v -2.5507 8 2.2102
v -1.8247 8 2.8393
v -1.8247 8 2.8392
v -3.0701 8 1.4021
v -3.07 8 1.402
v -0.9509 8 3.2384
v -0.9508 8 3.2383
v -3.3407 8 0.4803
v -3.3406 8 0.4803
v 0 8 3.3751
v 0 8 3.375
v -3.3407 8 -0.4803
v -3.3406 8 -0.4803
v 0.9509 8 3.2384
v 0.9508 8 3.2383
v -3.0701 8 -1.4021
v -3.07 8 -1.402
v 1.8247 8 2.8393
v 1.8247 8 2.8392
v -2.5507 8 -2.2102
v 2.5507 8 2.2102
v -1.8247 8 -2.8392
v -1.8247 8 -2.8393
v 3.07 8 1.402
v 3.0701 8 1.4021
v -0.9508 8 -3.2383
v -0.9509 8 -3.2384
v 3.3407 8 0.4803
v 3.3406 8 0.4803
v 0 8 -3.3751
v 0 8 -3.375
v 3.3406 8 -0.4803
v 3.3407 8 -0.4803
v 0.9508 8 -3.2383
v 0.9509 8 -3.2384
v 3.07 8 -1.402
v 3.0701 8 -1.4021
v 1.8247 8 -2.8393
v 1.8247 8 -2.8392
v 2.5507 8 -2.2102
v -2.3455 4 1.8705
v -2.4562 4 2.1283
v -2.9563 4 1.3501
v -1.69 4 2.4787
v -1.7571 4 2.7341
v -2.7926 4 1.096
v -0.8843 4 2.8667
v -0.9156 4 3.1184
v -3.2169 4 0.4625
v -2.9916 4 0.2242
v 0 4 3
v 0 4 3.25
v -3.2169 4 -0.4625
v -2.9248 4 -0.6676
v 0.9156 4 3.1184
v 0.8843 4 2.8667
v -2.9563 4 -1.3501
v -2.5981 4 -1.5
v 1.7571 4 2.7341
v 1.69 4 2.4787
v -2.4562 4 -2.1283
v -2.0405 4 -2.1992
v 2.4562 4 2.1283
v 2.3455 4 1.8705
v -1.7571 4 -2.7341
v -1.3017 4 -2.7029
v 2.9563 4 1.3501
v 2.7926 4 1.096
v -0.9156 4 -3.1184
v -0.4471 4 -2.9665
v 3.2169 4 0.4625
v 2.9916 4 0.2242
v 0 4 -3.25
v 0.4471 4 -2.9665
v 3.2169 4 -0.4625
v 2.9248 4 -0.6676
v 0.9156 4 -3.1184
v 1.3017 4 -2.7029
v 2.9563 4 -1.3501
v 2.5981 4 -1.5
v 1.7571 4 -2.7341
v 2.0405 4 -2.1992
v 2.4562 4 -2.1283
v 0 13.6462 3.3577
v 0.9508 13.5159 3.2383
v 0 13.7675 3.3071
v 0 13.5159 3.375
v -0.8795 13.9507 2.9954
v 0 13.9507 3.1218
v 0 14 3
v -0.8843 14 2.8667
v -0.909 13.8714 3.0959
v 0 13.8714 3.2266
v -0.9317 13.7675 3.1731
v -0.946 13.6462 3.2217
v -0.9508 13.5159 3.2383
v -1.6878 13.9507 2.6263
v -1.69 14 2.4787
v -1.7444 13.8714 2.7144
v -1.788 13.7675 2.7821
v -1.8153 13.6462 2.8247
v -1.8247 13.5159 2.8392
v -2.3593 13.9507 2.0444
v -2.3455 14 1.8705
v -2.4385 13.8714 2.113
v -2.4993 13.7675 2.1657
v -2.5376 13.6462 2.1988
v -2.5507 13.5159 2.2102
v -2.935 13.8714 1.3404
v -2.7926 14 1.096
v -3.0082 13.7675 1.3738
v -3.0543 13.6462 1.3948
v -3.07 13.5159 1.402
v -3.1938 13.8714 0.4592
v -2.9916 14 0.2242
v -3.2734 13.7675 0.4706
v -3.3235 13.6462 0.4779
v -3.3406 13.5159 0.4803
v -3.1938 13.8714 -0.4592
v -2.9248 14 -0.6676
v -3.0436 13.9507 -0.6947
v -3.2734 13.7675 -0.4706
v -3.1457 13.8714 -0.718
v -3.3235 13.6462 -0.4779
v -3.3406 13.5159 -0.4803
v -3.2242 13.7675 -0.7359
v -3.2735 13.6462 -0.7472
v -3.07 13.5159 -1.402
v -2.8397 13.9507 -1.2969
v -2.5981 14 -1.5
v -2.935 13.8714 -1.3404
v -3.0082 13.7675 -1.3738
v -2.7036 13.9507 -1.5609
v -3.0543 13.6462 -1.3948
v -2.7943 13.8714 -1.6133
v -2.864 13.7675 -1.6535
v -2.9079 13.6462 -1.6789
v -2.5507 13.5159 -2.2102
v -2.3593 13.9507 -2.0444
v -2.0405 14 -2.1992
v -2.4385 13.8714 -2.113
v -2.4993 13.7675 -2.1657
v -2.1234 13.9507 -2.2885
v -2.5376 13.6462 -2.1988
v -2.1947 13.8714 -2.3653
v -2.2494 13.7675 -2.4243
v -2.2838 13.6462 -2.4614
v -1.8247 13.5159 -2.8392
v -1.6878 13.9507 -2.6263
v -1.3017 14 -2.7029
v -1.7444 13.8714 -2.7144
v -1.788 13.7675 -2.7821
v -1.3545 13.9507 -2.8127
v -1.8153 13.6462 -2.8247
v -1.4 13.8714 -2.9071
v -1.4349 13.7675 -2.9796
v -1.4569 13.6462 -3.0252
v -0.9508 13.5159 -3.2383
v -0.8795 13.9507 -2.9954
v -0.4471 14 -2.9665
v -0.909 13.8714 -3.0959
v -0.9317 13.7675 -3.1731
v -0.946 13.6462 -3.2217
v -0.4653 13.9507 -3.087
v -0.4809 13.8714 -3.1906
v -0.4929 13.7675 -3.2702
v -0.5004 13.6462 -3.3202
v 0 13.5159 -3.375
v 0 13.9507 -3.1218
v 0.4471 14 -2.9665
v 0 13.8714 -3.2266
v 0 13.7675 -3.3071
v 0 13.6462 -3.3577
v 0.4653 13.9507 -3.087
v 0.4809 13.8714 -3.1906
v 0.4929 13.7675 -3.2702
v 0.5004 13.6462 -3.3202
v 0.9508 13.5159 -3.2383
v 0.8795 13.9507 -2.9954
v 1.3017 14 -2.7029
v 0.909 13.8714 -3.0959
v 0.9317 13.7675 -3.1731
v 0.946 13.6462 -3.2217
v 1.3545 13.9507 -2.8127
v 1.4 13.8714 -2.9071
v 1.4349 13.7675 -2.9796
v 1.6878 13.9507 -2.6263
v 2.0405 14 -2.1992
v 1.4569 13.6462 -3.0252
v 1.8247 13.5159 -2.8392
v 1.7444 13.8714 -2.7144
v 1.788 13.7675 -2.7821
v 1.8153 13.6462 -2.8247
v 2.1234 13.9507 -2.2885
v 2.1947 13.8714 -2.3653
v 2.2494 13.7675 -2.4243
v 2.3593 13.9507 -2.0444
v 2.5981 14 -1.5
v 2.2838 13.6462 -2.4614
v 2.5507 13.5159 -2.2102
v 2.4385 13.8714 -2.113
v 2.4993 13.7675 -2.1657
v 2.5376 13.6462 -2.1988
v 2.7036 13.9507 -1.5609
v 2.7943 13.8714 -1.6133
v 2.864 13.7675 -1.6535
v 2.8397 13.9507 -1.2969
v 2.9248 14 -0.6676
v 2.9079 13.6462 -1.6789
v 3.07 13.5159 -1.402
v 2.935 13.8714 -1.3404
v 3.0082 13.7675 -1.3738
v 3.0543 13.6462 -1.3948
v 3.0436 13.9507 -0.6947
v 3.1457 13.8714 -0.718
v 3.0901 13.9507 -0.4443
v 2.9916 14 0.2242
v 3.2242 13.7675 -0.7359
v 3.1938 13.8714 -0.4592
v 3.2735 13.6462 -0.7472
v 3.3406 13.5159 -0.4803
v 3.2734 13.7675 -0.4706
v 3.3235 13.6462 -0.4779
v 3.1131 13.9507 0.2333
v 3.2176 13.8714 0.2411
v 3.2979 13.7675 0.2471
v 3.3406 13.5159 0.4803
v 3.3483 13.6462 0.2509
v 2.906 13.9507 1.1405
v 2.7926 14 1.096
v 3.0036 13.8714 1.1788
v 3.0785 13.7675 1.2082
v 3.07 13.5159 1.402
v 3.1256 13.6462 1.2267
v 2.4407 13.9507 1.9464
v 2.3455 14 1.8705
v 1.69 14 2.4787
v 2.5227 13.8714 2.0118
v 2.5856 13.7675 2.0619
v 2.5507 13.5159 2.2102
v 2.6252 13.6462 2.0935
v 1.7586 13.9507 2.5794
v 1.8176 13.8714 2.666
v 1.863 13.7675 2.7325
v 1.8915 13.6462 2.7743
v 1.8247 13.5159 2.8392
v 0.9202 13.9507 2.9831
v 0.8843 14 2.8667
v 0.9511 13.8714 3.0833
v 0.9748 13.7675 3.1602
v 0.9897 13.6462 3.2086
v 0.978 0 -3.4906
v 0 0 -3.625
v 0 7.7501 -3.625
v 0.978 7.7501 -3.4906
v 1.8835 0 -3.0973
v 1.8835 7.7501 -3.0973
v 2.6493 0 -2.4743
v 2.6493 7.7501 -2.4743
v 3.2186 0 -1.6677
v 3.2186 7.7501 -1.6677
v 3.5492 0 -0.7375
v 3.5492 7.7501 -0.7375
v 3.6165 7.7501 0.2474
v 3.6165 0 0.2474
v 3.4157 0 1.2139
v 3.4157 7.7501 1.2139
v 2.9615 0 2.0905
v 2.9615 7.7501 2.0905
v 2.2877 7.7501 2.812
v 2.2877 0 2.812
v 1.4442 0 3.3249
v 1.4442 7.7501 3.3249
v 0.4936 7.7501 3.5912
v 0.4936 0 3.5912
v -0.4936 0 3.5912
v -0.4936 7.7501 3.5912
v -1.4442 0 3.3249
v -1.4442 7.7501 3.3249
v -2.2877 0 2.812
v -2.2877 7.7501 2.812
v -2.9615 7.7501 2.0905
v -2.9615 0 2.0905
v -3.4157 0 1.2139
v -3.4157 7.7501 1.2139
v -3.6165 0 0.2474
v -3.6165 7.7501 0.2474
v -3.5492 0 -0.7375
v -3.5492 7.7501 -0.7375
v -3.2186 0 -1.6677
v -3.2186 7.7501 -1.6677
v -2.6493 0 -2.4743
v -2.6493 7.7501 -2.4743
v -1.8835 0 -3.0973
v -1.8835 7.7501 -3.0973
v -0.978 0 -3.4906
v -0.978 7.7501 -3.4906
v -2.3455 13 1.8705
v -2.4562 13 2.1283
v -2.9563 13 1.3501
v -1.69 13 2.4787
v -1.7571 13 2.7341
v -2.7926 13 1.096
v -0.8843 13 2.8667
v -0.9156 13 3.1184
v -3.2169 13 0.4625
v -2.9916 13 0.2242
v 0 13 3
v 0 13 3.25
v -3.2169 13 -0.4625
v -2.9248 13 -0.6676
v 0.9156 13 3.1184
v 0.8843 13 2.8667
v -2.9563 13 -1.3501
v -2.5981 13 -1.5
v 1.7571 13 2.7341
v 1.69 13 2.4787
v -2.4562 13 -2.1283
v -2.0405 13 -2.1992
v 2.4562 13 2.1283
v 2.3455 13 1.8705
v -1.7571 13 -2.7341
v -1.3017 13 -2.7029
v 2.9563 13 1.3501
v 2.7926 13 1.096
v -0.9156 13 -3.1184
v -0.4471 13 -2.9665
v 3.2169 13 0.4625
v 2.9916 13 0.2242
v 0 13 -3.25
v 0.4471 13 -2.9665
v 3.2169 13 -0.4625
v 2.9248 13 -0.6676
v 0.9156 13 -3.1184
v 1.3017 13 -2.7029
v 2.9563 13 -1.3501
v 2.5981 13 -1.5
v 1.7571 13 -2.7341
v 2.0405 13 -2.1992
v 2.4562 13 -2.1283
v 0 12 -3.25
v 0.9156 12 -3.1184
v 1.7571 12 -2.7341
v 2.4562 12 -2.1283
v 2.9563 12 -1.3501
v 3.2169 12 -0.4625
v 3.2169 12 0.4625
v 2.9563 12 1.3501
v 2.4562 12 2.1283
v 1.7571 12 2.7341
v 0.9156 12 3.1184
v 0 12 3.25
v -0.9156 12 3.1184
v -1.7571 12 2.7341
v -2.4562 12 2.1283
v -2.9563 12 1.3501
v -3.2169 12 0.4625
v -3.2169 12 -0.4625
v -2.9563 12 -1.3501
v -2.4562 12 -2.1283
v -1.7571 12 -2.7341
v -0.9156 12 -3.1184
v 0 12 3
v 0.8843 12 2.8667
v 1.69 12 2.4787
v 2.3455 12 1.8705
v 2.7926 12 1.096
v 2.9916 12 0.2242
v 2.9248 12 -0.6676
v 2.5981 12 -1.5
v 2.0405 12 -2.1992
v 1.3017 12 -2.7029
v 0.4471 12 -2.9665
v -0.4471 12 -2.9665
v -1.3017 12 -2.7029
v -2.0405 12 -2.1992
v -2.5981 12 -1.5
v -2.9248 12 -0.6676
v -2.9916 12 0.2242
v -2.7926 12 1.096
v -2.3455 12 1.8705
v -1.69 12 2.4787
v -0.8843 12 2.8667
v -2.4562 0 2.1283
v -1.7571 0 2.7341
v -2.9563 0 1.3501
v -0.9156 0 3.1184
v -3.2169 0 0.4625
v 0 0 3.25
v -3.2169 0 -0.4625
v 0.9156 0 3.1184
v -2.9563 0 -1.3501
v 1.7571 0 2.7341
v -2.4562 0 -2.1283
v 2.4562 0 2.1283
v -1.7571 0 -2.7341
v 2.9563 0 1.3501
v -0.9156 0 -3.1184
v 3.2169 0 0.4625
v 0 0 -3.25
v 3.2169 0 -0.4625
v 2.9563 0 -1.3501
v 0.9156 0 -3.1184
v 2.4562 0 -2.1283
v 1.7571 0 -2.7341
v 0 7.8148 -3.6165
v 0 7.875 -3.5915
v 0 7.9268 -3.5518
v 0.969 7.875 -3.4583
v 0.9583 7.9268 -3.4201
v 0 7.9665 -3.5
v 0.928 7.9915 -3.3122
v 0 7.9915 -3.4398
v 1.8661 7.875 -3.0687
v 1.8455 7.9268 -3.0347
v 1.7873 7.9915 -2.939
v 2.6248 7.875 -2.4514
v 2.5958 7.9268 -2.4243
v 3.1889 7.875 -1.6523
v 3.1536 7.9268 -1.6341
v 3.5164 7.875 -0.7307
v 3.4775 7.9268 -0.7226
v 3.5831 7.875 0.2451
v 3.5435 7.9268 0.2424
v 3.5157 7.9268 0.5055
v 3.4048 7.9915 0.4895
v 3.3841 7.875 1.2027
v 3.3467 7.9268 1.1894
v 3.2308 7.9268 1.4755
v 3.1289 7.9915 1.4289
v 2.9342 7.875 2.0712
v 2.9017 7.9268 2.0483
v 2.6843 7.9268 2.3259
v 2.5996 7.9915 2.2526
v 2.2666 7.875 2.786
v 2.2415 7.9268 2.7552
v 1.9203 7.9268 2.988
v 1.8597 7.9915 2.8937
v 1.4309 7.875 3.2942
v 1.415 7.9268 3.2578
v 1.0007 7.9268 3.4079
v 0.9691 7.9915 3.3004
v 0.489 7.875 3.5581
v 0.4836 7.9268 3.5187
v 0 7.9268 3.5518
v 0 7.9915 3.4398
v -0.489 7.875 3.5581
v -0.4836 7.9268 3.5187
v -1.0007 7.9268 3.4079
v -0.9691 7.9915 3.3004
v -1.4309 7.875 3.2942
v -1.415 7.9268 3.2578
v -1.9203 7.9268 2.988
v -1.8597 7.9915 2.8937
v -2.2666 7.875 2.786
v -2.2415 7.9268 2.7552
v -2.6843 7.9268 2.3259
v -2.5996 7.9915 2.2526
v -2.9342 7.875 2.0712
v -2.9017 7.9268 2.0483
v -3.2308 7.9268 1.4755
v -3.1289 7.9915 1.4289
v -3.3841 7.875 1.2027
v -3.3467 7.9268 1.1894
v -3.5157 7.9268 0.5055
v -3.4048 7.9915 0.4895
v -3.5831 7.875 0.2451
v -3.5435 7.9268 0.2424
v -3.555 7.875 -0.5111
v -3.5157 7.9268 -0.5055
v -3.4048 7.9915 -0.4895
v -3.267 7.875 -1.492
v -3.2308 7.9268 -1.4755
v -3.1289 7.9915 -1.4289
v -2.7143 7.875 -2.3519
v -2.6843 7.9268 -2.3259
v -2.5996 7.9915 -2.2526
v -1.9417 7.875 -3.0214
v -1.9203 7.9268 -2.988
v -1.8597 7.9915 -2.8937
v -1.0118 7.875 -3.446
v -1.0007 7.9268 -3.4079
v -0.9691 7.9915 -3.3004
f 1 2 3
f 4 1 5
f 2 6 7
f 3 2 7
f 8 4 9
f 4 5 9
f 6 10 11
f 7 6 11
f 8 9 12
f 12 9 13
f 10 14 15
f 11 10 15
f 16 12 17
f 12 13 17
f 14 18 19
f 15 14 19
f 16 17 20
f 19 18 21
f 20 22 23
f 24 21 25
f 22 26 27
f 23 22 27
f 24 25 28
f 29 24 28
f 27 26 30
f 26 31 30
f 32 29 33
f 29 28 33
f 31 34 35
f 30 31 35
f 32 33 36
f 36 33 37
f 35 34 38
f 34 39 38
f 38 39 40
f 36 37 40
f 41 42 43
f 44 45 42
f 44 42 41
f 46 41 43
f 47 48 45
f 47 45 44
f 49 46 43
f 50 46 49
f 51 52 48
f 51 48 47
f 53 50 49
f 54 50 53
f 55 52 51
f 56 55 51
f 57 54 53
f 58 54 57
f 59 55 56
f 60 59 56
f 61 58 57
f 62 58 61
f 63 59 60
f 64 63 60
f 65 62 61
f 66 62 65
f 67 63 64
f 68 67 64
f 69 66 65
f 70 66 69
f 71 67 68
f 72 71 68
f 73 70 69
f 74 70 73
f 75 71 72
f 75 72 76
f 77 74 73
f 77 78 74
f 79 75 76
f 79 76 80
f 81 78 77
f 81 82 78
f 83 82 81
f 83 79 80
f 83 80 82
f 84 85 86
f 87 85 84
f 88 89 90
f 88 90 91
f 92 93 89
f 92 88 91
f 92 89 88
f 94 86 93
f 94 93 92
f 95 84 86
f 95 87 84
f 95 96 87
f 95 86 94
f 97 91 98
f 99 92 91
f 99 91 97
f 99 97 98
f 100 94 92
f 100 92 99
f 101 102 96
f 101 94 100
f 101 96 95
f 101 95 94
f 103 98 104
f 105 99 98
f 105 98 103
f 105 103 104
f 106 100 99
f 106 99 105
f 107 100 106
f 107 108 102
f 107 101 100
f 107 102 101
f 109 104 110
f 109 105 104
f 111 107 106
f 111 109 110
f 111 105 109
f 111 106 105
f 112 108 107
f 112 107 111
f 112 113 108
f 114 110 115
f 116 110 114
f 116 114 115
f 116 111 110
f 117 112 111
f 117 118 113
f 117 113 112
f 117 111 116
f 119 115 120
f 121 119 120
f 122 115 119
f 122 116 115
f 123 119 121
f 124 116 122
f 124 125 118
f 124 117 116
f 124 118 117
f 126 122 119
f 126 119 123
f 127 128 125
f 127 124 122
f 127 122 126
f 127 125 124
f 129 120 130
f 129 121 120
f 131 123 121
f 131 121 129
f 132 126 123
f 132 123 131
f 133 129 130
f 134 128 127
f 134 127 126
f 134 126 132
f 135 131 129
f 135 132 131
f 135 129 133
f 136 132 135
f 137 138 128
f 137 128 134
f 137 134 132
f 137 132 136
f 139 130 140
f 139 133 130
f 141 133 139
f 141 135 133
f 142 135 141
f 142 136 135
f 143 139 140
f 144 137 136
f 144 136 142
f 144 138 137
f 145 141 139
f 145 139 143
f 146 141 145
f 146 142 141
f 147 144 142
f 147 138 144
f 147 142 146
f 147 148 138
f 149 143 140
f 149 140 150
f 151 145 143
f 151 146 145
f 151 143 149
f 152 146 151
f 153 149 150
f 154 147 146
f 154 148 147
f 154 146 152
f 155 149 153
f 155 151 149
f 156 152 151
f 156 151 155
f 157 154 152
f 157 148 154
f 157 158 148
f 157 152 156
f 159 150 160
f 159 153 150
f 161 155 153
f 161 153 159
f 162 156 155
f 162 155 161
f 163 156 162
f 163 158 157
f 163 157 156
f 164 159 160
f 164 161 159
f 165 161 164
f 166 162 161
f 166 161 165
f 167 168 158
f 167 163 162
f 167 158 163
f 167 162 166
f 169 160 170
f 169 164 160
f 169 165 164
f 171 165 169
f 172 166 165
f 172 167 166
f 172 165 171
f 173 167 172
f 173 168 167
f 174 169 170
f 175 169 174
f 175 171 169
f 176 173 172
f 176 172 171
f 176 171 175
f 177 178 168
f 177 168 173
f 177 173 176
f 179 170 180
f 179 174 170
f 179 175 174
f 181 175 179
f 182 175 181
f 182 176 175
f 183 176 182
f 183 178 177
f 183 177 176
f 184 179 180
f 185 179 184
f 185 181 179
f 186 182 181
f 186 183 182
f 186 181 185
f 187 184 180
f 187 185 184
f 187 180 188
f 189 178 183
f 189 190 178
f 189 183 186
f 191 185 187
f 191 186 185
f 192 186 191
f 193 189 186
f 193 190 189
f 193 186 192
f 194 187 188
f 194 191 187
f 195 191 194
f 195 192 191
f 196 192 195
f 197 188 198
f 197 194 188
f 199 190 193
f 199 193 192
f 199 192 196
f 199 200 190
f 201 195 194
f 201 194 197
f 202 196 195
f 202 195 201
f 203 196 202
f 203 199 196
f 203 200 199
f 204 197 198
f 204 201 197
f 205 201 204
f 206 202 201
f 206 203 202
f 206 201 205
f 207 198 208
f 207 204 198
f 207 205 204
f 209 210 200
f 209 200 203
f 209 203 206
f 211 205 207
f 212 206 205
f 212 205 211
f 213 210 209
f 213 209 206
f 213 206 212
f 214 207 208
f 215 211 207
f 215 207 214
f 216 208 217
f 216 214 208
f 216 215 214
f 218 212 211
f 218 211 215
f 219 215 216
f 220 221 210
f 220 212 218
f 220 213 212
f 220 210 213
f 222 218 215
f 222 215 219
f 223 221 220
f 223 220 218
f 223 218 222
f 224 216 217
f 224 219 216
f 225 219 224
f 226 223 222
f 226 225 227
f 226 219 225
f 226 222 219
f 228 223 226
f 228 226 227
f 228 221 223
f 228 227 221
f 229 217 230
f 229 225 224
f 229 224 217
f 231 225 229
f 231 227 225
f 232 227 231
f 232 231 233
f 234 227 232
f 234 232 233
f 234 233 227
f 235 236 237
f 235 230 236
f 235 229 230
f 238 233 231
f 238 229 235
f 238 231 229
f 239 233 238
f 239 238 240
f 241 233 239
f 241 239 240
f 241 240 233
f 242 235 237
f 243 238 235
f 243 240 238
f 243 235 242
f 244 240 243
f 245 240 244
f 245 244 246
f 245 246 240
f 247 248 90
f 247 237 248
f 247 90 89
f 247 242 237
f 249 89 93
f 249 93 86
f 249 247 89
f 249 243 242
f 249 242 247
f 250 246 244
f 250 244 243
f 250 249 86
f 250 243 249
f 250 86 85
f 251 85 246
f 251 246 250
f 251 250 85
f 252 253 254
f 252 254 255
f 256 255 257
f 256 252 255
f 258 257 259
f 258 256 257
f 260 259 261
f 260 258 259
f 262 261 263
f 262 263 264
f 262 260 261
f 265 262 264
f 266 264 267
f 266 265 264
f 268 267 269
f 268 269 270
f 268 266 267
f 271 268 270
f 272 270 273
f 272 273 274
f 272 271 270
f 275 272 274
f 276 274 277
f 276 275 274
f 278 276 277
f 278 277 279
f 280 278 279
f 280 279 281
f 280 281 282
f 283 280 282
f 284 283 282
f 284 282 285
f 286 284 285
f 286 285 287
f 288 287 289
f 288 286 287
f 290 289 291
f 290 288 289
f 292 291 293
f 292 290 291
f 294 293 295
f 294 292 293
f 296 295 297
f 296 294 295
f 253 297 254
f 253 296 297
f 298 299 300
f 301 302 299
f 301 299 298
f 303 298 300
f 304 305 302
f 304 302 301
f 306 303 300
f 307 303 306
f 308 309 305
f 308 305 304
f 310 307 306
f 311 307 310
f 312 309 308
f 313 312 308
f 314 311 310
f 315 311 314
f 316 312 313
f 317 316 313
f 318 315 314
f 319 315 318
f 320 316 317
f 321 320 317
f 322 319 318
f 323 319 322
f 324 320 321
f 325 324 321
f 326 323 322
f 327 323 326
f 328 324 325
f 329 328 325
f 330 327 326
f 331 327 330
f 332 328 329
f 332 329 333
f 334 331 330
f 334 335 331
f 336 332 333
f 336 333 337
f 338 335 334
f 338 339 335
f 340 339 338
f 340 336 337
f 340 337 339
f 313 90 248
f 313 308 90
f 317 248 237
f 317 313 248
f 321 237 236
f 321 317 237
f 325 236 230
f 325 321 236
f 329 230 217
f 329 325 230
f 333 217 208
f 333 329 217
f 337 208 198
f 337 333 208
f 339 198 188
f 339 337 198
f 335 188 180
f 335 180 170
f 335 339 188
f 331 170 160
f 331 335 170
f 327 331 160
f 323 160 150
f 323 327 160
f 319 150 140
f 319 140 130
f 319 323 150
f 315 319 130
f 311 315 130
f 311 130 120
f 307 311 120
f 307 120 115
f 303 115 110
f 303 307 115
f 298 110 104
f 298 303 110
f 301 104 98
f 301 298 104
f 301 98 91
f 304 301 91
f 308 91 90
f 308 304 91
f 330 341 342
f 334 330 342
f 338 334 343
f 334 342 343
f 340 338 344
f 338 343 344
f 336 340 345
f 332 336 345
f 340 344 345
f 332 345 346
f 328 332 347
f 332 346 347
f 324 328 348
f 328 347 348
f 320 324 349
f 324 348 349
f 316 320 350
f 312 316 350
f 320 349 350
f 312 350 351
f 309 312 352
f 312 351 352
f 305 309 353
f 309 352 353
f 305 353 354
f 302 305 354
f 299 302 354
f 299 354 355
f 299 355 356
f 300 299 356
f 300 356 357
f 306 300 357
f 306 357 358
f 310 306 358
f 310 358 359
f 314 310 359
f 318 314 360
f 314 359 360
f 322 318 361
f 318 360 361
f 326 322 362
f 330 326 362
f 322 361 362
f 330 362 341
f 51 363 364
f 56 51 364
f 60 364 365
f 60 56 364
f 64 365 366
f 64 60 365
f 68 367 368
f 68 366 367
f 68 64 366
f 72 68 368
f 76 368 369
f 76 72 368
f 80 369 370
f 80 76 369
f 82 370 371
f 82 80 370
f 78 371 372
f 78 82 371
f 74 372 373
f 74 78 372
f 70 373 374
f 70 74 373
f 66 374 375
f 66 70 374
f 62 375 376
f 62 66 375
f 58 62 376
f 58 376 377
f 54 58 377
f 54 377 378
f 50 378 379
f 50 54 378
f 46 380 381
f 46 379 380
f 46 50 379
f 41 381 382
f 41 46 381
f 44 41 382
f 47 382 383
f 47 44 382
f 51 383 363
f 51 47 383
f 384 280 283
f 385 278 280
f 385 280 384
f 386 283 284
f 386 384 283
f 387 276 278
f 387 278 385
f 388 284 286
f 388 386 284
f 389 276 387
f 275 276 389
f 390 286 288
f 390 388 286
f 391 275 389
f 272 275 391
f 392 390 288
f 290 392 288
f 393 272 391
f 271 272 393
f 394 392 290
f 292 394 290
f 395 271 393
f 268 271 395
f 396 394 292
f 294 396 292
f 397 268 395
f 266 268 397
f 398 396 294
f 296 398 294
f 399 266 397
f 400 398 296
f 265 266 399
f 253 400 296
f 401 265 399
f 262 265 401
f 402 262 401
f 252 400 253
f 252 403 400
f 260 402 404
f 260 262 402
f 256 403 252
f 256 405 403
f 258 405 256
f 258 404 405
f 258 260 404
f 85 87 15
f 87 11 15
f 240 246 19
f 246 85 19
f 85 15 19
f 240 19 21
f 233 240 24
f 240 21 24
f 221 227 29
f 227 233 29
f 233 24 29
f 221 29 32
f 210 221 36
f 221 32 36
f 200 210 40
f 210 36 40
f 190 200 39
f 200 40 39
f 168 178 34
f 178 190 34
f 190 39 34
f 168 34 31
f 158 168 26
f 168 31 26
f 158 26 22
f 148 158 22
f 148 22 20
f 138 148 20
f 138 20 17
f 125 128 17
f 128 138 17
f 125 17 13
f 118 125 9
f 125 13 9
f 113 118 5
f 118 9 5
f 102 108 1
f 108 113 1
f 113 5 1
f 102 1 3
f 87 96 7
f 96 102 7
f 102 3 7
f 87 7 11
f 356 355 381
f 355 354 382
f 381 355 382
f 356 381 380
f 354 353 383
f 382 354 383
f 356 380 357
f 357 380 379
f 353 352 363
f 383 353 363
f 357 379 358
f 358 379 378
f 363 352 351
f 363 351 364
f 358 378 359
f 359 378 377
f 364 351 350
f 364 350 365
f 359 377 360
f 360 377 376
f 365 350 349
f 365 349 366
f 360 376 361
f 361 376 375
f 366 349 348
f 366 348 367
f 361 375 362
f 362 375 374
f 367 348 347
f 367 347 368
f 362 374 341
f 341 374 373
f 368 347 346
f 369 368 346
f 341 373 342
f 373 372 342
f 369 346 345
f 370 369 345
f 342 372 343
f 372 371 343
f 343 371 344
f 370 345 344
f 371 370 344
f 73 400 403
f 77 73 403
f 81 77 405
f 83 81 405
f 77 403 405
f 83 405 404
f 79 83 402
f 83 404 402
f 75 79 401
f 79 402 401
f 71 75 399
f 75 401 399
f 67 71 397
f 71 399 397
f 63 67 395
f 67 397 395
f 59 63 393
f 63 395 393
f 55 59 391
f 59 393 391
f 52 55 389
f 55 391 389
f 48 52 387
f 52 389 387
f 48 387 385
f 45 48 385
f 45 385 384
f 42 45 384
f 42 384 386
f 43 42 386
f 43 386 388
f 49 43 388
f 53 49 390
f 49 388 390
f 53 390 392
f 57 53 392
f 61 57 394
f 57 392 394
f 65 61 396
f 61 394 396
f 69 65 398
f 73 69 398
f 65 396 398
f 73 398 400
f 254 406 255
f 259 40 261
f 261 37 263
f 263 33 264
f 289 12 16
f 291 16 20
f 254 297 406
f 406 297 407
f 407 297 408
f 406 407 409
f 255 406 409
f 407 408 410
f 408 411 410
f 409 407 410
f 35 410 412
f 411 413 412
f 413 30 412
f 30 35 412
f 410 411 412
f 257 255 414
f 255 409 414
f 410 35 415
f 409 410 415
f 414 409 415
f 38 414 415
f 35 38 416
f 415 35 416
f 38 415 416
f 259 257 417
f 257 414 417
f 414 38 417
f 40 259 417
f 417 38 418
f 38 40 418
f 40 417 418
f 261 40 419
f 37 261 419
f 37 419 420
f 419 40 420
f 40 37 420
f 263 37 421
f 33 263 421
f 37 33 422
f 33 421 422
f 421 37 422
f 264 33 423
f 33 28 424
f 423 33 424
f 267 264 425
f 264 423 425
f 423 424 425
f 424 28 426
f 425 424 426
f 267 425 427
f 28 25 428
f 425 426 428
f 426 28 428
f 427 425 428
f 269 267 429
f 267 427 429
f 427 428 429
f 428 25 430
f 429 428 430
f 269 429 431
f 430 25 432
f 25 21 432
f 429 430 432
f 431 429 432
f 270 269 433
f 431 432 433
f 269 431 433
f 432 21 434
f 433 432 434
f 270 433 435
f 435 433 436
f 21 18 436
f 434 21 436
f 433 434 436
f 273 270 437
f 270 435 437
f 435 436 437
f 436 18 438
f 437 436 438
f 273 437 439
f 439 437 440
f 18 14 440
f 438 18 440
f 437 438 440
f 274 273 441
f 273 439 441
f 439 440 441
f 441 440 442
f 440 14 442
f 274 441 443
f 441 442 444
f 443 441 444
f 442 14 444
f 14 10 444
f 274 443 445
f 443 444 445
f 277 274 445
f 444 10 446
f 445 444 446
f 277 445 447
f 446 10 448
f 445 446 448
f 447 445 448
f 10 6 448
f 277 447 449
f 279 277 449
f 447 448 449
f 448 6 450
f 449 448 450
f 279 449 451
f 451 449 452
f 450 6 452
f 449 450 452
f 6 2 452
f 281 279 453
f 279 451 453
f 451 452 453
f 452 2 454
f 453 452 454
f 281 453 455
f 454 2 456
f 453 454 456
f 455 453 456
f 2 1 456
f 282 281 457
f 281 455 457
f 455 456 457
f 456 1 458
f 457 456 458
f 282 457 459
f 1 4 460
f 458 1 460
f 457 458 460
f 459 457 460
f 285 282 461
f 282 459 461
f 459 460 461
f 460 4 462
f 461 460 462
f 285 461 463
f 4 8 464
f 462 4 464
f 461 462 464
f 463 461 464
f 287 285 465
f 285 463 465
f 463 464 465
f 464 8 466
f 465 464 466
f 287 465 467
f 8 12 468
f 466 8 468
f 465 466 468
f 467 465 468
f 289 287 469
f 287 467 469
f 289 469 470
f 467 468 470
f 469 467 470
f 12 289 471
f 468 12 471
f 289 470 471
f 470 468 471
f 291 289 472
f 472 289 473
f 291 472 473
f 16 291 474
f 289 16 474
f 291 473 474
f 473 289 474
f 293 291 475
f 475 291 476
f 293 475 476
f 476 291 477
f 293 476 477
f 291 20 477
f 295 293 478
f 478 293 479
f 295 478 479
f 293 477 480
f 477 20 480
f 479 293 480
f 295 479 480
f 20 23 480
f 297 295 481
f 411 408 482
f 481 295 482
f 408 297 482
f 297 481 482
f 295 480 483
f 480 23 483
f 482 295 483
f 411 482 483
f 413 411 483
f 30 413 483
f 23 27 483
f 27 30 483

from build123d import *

# Parameters (mm, degrees)
SKETCH1_R           = 3.375
SKETCH1_R_2         = 3
BOSS_EXTRUDE1_DEPTH = 14
SKETCH2_R           = 3.625
SKETCH2_R_2         = 3
BOSS_EXTRUDE2_DEPTH = 8
FILLET1_R           = 0.25
BOSS_EXTRUDE3_START = -0.5
SKETCH3_R           = 3.375
SKETCH3_R_2         = 3
BOSS_EXTRUDE3_DEPTH = 0.5
FILLET2_R           = 0.5
SKETCH4_R           = 3.25
CUT_EXTRUDE1_DEPTH  = 4
SKETCH5_R           = 3.25
CUT_EXTRUDE2_DEPTH  = 1


# Some blends are built 0.0001 mm under size
with BuildPart() as part:
    # Sketch1 → Boss-Extrude1 (new body)
    with BuildSketch(Plane(origin=(0, 0, 0), x_dir=(1, 0, 0), z_dir=(0, 1, 0))):
        with Locations(Location((0, 0, 0), (0, 0, 270))):
            Circle(SKETCH1_R)
        with Locations(Location((0, 0, 0), (0, 0, 270))):
            Circle(SKETCH1_R_2, mode=Mode.SUBTRACT)
    extrude(amount=BOSS_EXTRUDE1_DEPTH)

    # Sketch2 → Boss-Extrude2 (add)
    with BuildSketch(Plane.XZ):
        with Locations(Location((0, 0, 0), (0, 0, 270))):
            Circle(SKETCH2_R)
        with Locations(Location((0, 0, 0), (0, 0, 90))):
            Circle(SKETCH2_R_2, mode=Mode.SUBTRACT)
    extrude(amount=-BOSS_EXTRUDE2_DEPTH)

    # Fillet1
    fillet1_edges = [part.edges().sort_by_distance(p)[0] for p in [
        (0, 8, 3.625),
    ]]
    fillet(fillet1_edges, radius=FILLET1_R - 0.0001)  # a hair under: the kernel refuses the full size

    # Sketch3 → Boss-Extrude3 (add)
    with BuildSketch(Plane(origin=(0, 14, 0), x_dir=(1, 0, 0), z_dir=(0, 1, 0)).offset(BOSS_EXTRUDE3_START)):
        with Locations(Location((0, 0, 0), (0, 0, 90))):
            Circle(SKETCH3_R)
        with Locations(Location((0, 0, 0), (0, 0, 270))):
            Circle(SKETCH3_R_2, mode=Mode.SUBTRACT)
    extrude(amount=BOSS_EXTRUDE3_DEPTH)

    # Fillet2
    # the kernel refuses this fillet: 0.5 mm, written as the material it takes off along each edge
    with BuildSketch(Plane(origin=(0, 14, 0), x_dir=(0, 0, 1), z_dir=(1, 0, 0))) as fillet2_piece_1:
        with BuildLine():
            CenterArc((2.875, 0.484122918), FILLET2_R, 284.477512186, 75.522487814)
            Line((3.375, 0.484122918), (3.385, 0.484122918))
            Line((3.385, 0.484122918), (3.385, 0))
            Line((3.385, 0), (3.375, -0.01))
            ThreePointArc((3.375, -0.01), (3.1875, -0.01), (3.0025, -0.009682458))
            Line((3.0025, -0.009682458), (3, 0))
        make_face()
    revolve(axis=Axis((0, 14, 0), (0, -1, 0)), mode=Mode.SUBTRACT)

    # Sketch4 → Cut-Extrude1 (cut)
    with BuildSketch(Plane.XZ):
        with Locations(Location((0, 0, 0), (0, 0, 270))):
            Circle(SKETCH4_R)
    extrude(amount=-CUT_EXTRUDE1_DEPTH, mode=Mode.SUBTRACT)

    # Sketch5 → Cut-Extrude2 (cut)
    with BuildSketch(Plane(origin=(0, 12, 0), x_dir=(-1, 0, 0), z_dir=(0, -1, 0))):
        with Locations(Location((0, 0, 0), (0, 0, 90))):
            Circle(SKETCH5_R)
    extrude(amount=-CUT_EXTRUDE2_DEPTH, mode=Mode.SUBTRACT)


solid = part.part
